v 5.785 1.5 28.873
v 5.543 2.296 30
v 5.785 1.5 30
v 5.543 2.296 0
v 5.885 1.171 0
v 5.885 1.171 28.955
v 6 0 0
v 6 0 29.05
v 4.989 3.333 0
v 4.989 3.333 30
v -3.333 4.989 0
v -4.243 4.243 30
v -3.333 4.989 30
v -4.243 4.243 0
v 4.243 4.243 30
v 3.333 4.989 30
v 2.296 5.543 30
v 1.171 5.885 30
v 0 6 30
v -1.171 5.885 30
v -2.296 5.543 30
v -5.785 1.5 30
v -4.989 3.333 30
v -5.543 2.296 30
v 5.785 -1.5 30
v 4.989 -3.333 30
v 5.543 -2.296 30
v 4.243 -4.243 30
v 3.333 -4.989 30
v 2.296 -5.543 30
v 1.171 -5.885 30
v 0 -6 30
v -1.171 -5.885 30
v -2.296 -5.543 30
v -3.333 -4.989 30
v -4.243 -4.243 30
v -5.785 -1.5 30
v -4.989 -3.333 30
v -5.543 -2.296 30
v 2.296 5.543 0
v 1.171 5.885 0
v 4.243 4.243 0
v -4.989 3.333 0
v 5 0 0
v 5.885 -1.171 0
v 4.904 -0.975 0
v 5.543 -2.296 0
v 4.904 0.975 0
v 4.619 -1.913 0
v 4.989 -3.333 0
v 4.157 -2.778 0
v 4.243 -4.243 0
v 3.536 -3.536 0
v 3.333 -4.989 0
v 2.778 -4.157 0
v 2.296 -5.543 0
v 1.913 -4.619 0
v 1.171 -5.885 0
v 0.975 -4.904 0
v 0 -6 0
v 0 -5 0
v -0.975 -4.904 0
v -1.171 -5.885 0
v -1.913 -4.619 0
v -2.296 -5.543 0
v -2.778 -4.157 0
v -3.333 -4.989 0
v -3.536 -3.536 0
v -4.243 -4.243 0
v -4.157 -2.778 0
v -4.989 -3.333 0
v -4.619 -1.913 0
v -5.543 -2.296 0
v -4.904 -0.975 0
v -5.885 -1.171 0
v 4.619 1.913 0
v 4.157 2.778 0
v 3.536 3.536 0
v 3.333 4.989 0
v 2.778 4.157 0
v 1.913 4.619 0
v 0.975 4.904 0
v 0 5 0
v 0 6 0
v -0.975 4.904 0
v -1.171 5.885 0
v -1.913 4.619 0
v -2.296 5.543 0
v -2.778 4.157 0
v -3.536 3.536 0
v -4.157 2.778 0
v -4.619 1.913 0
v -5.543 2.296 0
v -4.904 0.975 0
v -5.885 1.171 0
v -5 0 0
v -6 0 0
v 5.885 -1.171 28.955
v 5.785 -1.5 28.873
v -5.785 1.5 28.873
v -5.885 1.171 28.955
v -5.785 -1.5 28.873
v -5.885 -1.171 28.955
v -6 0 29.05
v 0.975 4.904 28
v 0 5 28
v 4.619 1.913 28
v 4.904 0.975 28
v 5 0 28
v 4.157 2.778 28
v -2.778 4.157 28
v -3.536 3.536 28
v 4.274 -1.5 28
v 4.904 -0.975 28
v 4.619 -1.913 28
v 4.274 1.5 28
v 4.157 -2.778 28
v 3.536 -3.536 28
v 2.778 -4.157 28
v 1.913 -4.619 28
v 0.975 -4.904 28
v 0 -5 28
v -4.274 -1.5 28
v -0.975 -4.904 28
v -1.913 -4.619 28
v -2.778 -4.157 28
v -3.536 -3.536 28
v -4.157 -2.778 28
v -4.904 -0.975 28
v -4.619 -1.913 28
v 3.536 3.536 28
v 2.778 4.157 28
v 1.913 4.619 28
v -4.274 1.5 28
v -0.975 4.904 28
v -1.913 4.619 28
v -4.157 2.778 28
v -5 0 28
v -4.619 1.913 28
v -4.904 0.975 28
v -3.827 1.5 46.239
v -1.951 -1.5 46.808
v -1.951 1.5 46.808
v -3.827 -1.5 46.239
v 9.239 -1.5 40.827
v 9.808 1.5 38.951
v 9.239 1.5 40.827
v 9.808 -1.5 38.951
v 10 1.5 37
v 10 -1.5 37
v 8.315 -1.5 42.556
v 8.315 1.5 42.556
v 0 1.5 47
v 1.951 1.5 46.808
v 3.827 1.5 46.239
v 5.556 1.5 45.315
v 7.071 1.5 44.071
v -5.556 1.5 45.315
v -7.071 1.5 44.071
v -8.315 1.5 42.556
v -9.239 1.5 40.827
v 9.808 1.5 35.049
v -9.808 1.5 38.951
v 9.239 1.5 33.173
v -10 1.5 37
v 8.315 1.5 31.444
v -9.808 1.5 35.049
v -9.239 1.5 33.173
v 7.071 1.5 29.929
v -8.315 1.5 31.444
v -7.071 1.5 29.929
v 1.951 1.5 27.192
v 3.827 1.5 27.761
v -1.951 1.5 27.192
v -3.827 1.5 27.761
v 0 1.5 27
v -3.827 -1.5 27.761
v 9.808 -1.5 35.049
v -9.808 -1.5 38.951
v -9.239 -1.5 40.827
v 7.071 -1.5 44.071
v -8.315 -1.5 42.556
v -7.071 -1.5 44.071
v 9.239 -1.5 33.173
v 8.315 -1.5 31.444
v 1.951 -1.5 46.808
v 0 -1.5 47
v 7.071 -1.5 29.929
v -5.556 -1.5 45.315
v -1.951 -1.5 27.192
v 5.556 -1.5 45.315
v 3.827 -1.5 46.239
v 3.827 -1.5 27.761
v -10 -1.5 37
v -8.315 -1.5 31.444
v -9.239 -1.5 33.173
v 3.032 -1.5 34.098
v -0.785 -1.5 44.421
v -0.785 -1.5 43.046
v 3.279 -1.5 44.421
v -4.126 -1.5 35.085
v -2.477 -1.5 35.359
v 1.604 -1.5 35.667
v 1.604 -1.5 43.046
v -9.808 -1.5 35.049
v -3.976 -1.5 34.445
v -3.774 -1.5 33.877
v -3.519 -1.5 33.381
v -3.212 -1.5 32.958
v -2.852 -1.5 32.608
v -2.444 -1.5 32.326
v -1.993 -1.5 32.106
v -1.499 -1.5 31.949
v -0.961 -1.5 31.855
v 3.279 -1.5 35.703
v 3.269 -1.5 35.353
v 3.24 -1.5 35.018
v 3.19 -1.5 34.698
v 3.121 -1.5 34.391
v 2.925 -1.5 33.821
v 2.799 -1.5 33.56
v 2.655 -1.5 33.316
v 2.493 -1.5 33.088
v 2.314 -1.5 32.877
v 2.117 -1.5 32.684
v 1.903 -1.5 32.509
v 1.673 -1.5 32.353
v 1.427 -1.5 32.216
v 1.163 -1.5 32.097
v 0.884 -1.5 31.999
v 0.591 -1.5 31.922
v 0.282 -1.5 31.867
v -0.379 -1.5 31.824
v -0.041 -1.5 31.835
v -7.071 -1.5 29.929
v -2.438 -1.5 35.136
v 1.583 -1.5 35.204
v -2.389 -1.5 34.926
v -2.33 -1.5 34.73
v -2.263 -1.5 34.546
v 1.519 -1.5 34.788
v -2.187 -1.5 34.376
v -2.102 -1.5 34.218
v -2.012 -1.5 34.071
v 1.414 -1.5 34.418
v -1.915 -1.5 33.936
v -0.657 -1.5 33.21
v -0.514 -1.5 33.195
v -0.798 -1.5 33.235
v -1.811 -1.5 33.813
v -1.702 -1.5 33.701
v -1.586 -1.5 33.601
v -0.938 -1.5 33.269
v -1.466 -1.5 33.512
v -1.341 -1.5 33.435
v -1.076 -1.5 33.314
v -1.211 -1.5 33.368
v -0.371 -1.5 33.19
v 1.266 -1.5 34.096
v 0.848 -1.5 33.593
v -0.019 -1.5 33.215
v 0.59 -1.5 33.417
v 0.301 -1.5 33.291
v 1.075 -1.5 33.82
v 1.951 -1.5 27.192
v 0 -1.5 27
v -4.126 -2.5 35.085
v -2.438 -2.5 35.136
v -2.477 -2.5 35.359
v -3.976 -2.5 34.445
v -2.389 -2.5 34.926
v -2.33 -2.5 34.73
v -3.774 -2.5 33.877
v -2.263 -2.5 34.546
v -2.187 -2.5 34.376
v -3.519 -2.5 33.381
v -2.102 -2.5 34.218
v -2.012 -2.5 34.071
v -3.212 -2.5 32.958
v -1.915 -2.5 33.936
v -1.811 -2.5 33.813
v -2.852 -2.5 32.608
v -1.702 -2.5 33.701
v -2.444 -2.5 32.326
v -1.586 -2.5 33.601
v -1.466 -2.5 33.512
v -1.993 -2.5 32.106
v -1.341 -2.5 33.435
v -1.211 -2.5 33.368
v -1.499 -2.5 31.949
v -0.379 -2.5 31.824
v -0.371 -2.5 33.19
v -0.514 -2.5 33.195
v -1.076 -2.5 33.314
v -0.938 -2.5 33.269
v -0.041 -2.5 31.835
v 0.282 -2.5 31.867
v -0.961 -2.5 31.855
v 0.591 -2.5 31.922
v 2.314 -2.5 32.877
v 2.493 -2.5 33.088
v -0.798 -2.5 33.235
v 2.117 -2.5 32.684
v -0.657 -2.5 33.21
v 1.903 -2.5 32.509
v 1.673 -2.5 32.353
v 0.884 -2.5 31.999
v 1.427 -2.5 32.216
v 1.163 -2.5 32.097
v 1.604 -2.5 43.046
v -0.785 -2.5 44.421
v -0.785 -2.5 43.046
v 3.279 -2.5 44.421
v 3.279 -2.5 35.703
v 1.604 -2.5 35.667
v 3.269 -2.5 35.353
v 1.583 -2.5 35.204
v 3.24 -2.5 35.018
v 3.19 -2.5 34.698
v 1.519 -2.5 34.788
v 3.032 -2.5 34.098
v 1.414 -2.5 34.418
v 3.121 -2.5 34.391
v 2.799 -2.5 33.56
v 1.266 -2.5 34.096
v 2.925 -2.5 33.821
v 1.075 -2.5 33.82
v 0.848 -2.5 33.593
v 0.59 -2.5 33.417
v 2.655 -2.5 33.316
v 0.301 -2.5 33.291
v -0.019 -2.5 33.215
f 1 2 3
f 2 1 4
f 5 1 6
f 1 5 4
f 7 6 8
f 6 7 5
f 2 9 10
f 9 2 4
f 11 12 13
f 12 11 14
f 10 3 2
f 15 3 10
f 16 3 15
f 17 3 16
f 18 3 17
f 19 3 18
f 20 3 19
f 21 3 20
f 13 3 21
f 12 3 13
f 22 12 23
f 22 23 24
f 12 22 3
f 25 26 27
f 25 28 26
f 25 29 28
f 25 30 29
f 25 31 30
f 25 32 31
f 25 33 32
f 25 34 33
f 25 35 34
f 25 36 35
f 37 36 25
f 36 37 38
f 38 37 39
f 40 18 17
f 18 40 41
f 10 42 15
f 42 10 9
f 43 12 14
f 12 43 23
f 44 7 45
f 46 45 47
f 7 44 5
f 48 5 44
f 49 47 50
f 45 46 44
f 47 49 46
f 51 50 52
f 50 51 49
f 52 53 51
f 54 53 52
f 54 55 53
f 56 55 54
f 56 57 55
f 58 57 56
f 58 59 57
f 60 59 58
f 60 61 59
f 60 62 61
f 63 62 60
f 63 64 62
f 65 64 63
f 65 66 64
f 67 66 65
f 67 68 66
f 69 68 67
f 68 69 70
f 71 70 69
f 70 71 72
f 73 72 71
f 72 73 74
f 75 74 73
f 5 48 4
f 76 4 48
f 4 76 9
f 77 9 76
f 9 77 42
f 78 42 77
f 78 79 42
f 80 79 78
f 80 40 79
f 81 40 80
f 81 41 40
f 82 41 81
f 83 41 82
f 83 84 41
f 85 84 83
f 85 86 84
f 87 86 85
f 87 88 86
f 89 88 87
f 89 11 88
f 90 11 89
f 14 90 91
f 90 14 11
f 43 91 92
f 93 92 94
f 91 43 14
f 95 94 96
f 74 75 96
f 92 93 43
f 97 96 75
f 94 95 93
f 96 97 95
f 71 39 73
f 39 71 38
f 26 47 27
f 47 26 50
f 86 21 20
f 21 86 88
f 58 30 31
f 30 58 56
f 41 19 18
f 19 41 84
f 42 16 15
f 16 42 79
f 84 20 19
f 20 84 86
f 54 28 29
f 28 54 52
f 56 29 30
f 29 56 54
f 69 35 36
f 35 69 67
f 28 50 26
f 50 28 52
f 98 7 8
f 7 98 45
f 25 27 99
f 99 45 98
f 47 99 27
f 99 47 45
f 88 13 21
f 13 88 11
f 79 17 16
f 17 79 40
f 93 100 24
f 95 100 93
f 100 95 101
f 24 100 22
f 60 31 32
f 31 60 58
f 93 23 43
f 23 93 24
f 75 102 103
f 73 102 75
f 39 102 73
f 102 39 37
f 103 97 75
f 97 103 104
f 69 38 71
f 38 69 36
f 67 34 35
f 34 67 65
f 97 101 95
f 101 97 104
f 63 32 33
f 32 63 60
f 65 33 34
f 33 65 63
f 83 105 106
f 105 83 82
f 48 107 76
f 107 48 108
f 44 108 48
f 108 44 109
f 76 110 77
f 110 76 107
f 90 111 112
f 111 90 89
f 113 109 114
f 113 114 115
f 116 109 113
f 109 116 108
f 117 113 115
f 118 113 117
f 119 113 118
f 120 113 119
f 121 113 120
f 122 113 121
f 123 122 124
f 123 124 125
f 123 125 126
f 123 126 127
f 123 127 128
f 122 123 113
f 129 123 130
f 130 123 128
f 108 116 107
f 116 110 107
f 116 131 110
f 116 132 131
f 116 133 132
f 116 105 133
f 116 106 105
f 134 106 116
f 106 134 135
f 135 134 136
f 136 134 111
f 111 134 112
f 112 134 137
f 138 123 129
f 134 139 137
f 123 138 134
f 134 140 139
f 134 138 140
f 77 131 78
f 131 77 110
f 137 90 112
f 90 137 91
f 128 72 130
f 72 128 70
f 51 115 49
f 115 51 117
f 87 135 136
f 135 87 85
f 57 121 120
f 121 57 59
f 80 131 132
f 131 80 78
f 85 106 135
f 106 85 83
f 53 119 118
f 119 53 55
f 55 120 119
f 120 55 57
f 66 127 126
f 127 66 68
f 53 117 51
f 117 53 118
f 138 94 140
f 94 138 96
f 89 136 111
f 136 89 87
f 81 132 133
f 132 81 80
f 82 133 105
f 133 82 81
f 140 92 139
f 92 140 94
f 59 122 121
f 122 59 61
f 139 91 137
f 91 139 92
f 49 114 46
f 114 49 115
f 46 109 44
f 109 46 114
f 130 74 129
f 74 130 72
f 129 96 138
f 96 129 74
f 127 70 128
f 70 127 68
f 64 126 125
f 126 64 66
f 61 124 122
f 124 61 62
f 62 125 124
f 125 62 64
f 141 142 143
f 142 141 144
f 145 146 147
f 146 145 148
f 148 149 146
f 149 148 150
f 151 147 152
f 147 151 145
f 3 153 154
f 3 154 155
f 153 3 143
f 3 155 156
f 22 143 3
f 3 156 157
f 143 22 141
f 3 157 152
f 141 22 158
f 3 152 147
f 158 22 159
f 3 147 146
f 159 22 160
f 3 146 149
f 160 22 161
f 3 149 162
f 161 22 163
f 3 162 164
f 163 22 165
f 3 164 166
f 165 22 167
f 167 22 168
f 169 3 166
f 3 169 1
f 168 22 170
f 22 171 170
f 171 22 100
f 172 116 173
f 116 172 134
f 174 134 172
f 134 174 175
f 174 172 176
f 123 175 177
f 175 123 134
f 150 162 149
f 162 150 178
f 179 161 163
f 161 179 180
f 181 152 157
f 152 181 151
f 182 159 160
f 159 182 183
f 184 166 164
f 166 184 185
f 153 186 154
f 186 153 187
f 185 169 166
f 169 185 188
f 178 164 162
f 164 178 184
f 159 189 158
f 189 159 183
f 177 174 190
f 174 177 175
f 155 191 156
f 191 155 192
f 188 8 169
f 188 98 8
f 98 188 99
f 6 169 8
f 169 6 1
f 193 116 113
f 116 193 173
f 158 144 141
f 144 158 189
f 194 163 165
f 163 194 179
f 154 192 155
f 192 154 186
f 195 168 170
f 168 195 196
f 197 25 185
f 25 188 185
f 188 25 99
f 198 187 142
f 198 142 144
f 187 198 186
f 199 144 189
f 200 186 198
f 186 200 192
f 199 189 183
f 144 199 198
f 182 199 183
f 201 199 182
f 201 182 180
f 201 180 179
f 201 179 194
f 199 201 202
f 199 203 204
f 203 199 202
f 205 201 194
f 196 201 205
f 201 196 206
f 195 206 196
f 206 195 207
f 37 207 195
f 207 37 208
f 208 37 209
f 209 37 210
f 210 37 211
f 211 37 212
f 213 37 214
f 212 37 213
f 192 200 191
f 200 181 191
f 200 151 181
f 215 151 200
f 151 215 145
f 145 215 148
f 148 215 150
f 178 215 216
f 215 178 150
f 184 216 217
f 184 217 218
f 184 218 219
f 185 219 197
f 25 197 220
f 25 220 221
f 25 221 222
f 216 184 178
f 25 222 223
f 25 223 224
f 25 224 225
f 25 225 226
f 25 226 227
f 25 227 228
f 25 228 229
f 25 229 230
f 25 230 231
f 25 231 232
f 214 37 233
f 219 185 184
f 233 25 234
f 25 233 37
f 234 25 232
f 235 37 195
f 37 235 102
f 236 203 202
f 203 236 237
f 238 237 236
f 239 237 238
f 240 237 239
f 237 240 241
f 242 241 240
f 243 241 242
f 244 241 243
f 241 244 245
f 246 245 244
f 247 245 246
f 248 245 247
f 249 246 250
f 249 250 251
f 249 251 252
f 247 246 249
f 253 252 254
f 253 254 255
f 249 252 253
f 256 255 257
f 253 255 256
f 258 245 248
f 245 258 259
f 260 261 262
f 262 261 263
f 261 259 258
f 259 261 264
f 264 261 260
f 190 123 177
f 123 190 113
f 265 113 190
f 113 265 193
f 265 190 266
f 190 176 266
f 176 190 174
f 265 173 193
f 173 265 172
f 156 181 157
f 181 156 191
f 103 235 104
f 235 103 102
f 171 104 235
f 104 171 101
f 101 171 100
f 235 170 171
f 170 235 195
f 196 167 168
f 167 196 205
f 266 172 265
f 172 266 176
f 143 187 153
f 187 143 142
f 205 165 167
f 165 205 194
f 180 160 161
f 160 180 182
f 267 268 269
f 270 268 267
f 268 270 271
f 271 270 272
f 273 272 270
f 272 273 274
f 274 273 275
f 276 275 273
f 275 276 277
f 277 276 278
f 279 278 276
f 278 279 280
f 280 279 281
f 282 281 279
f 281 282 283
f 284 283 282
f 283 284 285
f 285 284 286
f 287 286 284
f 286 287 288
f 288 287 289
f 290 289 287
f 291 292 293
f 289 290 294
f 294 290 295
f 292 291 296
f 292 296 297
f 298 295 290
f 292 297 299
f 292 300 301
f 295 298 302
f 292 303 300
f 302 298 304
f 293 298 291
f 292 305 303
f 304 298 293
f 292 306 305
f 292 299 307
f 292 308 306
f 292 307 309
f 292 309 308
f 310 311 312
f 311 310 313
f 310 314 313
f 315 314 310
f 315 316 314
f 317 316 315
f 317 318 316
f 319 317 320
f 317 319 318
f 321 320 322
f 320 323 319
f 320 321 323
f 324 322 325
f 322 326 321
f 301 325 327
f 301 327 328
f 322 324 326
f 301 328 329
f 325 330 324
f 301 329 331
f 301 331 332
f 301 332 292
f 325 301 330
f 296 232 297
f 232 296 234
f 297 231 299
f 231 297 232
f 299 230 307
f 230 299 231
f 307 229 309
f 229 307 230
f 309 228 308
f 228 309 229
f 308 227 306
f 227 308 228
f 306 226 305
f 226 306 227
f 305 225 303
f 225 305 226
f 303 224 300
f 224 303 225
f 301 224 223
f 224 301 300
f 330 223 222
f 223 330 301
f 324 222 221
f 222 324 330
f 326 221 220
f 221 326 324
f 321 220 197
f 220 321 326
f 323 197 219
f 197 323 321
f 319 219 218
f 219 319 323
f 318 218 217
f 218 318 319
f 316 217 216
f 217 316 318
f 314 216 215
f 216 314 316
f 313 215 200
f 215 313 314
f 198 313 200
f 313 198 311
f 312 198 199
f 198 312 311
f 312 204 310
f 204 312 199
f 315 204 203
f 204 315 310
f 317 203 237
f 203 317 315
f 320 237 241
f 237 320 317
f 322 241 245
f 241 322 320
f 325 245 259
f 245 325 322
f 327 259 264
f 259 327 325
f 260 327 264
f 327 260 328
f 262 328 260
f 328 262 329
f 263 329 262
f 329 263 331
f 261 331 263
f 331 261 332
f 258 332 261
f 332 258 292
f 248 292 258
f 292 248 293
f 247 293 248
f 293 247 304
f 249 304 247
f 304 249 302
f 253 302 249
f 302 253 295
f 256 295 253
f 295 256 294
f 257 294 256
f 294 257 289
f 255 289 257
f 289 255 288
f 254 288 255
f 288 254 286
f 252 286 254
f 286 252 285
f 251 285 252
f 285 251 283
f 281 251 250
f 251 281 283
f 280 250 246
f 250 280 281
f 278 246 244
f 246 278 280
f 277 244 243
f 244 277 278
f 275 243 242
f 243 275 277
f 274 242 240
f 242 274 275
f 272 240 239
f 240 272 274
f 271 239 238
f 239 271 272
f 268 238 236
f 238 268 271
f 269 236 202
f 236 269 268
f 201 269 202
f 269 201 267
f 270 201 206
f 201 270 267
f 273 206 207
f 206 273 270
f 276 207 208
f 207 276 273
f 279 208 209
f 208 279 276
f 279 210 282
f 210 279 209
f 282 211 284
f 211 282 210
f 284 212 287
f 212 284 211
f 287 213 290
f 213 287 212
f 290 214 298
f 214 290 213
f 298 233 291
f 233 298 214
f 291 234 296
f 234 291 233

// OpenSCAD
letter = "J";
diameter = 10;

$fn=32;

module PenCap(letter="J", diameter=8) {
  difference() {
    cylinder(h=30, d=diameter+2);
    translate([0, 0, -2]) {
      cylinder(h=30, d=diameter);
    }
  }
  translate([-9, 1.5, 28]) {
    rotate([90, 0, 0]) {
      translate([9, 9, 0]) {
        cylinder(h=3, d=20);
      }
      color("Blue")
      translate([9, 4, 1]) {
        linear_extrude(3) {
          text(letter, size=13, halign="center");
        }
      }
    }
    
  }
}

PenCap(letter, diameter);
